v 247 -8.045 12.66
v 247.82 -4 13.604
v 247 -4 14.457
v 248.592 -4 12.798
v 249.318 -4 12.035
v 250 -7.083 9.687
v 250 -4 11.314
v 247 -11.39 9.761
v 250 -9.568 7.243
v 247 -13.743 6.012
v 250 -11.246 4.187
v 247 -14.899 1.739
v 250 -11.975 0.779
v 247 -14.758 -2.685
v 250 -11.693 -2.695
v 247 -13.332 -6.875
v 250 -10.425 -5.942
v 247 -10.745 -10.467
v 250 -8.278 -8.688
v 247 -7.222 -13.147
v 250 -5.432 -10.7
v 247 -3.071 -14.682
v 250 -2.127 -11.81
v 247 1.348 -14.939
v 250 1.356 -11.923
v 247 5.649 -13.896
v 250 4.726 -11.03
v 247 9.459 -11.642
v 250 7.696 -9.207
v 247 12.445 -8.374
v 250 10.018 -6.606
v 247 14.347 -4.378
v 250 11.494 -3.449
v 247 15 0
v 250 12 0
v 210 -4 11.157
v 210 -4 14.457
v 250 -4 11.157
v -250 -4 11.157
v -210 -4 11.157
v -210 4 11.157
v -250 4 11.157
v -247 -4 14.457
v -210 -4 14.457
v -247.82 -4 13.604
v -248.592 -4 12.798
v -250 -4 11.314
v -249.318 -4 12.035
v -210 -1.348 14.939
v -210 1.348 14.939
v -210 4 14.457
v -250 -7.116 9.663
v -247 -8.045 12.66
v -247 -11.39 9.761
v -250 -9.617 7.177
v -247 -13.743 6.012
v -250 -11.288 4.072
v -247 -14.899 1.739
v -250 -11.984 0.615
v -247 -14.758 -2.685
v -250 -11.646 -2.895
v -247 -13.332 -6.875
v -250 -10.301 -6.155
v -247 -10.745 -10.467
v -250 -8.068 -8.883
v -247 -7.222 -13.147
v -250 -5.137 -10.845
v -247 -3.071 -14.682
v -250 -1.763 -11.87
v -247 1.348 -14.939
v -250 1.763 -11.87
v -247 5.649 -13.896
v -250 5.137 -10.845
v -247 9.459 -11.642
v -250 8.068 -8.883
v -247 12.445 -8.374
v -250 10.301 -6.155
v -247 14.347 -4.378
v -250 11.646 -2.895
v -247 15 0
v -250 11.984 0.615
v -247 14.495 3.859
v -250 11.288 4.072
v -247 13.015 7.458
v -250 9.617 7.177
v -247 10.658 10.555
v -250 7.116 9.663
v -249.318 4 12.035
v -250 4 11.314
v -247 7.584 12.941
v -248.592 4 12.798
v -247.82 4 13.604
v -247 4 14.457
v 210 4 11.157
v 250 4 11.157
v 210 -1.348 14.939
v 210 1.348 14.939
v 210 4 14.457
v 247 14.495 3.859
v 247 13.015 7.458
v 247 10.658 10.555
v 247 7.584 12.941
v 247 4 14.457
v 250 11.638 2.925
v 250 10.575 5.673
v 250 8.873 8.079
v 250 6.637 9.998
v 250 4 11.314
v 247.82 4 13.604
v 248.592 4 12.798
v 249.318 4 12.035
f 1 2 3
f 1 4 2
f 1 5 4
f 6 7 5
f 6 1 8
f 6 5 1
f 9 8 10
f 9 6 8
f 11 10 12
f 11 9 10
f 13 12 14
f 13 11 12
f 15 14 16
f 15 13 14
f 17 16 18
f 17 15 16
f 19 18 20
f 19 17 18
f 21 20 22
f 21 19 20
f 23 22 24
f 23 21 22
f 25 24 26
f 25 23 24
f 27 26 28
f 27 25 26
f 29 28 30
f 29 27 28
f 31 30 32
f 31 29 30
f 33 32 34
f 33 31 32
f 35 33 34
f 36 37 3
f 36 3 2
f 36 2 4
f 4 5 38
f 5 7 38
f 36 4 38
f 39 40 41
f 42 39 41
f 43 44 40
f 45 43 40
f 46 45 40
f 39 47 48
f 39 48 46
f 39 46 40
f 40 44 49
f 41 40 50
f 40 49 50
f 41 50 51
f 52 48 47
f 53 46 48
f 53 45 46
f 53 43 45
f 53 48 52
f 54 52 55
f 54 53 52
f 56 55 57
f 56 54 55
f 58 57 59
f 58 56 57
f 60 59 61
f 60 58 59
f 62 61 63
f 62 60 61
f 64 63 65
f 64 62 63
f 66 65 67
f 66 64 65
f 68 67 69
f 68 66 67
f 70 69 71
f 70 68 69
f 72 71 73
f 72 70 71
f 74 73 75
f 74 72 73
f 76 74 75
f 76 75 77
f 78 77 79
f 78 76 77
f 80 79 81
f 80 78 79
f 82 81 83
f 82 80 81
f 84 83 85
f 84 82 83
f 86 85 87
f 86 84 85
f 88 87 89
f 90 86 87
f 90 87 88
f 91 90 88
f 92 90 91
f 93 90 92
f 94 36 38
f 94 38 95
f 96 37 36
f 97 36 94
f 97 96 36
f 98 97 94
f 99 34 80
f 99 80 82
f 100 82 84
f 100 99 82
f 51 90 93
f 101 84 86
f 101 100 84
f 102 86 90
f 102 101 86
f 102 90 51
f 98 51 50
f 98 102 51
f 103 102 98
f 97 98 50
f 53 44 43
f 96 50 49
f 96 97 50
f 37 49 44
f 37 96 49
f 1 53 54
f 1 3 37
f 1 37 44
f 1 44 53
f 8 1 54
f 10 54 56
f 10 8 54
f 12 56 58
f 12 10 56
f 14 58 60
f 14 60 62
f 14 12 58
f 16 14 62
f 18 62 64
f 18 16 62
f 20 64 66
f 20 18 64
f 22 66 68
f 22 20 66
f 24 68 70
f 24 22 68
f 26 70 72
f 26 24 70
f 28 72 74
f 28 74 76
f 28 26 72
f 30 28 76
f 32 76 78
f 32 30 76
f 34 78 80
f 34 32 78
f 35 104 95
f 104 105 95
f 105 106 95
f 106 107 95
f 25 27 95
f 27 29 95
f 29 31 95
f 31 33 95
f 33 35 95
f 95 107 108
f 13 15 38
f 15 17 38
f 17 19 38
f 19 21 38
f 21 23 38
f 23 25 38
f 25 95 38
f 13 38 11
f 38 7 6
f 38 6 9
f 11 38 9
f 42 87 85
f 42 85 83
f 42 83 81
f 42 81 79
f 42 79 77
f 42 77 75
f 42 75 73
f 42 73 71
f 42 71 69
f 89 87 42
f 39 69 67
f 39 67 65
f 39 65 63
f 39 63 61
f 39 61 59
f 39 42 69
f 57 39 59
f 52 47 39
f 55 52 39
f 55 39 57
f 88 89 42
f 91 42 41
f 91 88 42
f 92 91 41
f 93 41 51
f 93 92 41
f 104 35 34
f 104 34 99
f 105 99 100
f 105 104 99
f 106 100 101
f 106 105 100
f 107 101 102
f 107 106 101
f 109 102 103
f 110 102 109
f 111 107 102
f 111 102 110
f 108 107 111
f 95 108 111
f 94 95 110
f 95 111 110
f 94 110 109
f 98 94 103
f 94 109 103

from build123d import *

# Parameters (mm, degrees)
F0_W     = 500
F0_H     = 15
F3_DEPTH = 40
F4_SIZE2 = 3
F4_SIZE  = 3


# Not quite as in the source:
# - a pattern or mirror of a feature is missing from the dataset's text; its kind, count and spacing are read off the source's solid


with BuildPart() as f1:
    # F0 (on Top) → F1 (revolve)
    with BuildSketch(Plane.XY):
        with Locations((0, 7.5)):
            Rectangle(F0_W, F0_H)
    revolve(axis=Axis((0, 0, 0), (1, 0, 0)))

    # F2 (on face) → F3 (cut)
    with BuildSketch(Plane.YZ.offset(250)):
        with BuildLine():
            ThreePointArc((4, 14.4568322948), (0, 15), (-4, 14.4568322948))
            Line((-4, 14.4568322948), (-4, 11.1568322948))
            Line((-4, 11.1568322948), (4, 11.1568322948))
            Line((4, 11.1568322948), (4, 14.4568322948))
        make_face()
    f3 = extrude(amount=-F3_DEPTH, mode=Mode.SUBTRACT)

    # F3_copies: F3 across plane
    add(f3.mirror(Plane(origin=(0, 0, 0), x_dir=(0, 0, -1), z_dir=(-1, 0, 0))), mode=Mode.SUBTRACT)

    # F4
    f4_edges = [f1.edges().sort_by_distance(p)[0] for p in [
        (250, -9.082951, -11.937336),
        (250, 11.937336, 9.082951),
        (-250, 11.937336, 9.082951),
        (-250, -9.082951, -11.937336),
    ]]
    chamfer(f4_edges, length=F4_SIZE, length2=F4_SIZE2)


solid = f1.part
